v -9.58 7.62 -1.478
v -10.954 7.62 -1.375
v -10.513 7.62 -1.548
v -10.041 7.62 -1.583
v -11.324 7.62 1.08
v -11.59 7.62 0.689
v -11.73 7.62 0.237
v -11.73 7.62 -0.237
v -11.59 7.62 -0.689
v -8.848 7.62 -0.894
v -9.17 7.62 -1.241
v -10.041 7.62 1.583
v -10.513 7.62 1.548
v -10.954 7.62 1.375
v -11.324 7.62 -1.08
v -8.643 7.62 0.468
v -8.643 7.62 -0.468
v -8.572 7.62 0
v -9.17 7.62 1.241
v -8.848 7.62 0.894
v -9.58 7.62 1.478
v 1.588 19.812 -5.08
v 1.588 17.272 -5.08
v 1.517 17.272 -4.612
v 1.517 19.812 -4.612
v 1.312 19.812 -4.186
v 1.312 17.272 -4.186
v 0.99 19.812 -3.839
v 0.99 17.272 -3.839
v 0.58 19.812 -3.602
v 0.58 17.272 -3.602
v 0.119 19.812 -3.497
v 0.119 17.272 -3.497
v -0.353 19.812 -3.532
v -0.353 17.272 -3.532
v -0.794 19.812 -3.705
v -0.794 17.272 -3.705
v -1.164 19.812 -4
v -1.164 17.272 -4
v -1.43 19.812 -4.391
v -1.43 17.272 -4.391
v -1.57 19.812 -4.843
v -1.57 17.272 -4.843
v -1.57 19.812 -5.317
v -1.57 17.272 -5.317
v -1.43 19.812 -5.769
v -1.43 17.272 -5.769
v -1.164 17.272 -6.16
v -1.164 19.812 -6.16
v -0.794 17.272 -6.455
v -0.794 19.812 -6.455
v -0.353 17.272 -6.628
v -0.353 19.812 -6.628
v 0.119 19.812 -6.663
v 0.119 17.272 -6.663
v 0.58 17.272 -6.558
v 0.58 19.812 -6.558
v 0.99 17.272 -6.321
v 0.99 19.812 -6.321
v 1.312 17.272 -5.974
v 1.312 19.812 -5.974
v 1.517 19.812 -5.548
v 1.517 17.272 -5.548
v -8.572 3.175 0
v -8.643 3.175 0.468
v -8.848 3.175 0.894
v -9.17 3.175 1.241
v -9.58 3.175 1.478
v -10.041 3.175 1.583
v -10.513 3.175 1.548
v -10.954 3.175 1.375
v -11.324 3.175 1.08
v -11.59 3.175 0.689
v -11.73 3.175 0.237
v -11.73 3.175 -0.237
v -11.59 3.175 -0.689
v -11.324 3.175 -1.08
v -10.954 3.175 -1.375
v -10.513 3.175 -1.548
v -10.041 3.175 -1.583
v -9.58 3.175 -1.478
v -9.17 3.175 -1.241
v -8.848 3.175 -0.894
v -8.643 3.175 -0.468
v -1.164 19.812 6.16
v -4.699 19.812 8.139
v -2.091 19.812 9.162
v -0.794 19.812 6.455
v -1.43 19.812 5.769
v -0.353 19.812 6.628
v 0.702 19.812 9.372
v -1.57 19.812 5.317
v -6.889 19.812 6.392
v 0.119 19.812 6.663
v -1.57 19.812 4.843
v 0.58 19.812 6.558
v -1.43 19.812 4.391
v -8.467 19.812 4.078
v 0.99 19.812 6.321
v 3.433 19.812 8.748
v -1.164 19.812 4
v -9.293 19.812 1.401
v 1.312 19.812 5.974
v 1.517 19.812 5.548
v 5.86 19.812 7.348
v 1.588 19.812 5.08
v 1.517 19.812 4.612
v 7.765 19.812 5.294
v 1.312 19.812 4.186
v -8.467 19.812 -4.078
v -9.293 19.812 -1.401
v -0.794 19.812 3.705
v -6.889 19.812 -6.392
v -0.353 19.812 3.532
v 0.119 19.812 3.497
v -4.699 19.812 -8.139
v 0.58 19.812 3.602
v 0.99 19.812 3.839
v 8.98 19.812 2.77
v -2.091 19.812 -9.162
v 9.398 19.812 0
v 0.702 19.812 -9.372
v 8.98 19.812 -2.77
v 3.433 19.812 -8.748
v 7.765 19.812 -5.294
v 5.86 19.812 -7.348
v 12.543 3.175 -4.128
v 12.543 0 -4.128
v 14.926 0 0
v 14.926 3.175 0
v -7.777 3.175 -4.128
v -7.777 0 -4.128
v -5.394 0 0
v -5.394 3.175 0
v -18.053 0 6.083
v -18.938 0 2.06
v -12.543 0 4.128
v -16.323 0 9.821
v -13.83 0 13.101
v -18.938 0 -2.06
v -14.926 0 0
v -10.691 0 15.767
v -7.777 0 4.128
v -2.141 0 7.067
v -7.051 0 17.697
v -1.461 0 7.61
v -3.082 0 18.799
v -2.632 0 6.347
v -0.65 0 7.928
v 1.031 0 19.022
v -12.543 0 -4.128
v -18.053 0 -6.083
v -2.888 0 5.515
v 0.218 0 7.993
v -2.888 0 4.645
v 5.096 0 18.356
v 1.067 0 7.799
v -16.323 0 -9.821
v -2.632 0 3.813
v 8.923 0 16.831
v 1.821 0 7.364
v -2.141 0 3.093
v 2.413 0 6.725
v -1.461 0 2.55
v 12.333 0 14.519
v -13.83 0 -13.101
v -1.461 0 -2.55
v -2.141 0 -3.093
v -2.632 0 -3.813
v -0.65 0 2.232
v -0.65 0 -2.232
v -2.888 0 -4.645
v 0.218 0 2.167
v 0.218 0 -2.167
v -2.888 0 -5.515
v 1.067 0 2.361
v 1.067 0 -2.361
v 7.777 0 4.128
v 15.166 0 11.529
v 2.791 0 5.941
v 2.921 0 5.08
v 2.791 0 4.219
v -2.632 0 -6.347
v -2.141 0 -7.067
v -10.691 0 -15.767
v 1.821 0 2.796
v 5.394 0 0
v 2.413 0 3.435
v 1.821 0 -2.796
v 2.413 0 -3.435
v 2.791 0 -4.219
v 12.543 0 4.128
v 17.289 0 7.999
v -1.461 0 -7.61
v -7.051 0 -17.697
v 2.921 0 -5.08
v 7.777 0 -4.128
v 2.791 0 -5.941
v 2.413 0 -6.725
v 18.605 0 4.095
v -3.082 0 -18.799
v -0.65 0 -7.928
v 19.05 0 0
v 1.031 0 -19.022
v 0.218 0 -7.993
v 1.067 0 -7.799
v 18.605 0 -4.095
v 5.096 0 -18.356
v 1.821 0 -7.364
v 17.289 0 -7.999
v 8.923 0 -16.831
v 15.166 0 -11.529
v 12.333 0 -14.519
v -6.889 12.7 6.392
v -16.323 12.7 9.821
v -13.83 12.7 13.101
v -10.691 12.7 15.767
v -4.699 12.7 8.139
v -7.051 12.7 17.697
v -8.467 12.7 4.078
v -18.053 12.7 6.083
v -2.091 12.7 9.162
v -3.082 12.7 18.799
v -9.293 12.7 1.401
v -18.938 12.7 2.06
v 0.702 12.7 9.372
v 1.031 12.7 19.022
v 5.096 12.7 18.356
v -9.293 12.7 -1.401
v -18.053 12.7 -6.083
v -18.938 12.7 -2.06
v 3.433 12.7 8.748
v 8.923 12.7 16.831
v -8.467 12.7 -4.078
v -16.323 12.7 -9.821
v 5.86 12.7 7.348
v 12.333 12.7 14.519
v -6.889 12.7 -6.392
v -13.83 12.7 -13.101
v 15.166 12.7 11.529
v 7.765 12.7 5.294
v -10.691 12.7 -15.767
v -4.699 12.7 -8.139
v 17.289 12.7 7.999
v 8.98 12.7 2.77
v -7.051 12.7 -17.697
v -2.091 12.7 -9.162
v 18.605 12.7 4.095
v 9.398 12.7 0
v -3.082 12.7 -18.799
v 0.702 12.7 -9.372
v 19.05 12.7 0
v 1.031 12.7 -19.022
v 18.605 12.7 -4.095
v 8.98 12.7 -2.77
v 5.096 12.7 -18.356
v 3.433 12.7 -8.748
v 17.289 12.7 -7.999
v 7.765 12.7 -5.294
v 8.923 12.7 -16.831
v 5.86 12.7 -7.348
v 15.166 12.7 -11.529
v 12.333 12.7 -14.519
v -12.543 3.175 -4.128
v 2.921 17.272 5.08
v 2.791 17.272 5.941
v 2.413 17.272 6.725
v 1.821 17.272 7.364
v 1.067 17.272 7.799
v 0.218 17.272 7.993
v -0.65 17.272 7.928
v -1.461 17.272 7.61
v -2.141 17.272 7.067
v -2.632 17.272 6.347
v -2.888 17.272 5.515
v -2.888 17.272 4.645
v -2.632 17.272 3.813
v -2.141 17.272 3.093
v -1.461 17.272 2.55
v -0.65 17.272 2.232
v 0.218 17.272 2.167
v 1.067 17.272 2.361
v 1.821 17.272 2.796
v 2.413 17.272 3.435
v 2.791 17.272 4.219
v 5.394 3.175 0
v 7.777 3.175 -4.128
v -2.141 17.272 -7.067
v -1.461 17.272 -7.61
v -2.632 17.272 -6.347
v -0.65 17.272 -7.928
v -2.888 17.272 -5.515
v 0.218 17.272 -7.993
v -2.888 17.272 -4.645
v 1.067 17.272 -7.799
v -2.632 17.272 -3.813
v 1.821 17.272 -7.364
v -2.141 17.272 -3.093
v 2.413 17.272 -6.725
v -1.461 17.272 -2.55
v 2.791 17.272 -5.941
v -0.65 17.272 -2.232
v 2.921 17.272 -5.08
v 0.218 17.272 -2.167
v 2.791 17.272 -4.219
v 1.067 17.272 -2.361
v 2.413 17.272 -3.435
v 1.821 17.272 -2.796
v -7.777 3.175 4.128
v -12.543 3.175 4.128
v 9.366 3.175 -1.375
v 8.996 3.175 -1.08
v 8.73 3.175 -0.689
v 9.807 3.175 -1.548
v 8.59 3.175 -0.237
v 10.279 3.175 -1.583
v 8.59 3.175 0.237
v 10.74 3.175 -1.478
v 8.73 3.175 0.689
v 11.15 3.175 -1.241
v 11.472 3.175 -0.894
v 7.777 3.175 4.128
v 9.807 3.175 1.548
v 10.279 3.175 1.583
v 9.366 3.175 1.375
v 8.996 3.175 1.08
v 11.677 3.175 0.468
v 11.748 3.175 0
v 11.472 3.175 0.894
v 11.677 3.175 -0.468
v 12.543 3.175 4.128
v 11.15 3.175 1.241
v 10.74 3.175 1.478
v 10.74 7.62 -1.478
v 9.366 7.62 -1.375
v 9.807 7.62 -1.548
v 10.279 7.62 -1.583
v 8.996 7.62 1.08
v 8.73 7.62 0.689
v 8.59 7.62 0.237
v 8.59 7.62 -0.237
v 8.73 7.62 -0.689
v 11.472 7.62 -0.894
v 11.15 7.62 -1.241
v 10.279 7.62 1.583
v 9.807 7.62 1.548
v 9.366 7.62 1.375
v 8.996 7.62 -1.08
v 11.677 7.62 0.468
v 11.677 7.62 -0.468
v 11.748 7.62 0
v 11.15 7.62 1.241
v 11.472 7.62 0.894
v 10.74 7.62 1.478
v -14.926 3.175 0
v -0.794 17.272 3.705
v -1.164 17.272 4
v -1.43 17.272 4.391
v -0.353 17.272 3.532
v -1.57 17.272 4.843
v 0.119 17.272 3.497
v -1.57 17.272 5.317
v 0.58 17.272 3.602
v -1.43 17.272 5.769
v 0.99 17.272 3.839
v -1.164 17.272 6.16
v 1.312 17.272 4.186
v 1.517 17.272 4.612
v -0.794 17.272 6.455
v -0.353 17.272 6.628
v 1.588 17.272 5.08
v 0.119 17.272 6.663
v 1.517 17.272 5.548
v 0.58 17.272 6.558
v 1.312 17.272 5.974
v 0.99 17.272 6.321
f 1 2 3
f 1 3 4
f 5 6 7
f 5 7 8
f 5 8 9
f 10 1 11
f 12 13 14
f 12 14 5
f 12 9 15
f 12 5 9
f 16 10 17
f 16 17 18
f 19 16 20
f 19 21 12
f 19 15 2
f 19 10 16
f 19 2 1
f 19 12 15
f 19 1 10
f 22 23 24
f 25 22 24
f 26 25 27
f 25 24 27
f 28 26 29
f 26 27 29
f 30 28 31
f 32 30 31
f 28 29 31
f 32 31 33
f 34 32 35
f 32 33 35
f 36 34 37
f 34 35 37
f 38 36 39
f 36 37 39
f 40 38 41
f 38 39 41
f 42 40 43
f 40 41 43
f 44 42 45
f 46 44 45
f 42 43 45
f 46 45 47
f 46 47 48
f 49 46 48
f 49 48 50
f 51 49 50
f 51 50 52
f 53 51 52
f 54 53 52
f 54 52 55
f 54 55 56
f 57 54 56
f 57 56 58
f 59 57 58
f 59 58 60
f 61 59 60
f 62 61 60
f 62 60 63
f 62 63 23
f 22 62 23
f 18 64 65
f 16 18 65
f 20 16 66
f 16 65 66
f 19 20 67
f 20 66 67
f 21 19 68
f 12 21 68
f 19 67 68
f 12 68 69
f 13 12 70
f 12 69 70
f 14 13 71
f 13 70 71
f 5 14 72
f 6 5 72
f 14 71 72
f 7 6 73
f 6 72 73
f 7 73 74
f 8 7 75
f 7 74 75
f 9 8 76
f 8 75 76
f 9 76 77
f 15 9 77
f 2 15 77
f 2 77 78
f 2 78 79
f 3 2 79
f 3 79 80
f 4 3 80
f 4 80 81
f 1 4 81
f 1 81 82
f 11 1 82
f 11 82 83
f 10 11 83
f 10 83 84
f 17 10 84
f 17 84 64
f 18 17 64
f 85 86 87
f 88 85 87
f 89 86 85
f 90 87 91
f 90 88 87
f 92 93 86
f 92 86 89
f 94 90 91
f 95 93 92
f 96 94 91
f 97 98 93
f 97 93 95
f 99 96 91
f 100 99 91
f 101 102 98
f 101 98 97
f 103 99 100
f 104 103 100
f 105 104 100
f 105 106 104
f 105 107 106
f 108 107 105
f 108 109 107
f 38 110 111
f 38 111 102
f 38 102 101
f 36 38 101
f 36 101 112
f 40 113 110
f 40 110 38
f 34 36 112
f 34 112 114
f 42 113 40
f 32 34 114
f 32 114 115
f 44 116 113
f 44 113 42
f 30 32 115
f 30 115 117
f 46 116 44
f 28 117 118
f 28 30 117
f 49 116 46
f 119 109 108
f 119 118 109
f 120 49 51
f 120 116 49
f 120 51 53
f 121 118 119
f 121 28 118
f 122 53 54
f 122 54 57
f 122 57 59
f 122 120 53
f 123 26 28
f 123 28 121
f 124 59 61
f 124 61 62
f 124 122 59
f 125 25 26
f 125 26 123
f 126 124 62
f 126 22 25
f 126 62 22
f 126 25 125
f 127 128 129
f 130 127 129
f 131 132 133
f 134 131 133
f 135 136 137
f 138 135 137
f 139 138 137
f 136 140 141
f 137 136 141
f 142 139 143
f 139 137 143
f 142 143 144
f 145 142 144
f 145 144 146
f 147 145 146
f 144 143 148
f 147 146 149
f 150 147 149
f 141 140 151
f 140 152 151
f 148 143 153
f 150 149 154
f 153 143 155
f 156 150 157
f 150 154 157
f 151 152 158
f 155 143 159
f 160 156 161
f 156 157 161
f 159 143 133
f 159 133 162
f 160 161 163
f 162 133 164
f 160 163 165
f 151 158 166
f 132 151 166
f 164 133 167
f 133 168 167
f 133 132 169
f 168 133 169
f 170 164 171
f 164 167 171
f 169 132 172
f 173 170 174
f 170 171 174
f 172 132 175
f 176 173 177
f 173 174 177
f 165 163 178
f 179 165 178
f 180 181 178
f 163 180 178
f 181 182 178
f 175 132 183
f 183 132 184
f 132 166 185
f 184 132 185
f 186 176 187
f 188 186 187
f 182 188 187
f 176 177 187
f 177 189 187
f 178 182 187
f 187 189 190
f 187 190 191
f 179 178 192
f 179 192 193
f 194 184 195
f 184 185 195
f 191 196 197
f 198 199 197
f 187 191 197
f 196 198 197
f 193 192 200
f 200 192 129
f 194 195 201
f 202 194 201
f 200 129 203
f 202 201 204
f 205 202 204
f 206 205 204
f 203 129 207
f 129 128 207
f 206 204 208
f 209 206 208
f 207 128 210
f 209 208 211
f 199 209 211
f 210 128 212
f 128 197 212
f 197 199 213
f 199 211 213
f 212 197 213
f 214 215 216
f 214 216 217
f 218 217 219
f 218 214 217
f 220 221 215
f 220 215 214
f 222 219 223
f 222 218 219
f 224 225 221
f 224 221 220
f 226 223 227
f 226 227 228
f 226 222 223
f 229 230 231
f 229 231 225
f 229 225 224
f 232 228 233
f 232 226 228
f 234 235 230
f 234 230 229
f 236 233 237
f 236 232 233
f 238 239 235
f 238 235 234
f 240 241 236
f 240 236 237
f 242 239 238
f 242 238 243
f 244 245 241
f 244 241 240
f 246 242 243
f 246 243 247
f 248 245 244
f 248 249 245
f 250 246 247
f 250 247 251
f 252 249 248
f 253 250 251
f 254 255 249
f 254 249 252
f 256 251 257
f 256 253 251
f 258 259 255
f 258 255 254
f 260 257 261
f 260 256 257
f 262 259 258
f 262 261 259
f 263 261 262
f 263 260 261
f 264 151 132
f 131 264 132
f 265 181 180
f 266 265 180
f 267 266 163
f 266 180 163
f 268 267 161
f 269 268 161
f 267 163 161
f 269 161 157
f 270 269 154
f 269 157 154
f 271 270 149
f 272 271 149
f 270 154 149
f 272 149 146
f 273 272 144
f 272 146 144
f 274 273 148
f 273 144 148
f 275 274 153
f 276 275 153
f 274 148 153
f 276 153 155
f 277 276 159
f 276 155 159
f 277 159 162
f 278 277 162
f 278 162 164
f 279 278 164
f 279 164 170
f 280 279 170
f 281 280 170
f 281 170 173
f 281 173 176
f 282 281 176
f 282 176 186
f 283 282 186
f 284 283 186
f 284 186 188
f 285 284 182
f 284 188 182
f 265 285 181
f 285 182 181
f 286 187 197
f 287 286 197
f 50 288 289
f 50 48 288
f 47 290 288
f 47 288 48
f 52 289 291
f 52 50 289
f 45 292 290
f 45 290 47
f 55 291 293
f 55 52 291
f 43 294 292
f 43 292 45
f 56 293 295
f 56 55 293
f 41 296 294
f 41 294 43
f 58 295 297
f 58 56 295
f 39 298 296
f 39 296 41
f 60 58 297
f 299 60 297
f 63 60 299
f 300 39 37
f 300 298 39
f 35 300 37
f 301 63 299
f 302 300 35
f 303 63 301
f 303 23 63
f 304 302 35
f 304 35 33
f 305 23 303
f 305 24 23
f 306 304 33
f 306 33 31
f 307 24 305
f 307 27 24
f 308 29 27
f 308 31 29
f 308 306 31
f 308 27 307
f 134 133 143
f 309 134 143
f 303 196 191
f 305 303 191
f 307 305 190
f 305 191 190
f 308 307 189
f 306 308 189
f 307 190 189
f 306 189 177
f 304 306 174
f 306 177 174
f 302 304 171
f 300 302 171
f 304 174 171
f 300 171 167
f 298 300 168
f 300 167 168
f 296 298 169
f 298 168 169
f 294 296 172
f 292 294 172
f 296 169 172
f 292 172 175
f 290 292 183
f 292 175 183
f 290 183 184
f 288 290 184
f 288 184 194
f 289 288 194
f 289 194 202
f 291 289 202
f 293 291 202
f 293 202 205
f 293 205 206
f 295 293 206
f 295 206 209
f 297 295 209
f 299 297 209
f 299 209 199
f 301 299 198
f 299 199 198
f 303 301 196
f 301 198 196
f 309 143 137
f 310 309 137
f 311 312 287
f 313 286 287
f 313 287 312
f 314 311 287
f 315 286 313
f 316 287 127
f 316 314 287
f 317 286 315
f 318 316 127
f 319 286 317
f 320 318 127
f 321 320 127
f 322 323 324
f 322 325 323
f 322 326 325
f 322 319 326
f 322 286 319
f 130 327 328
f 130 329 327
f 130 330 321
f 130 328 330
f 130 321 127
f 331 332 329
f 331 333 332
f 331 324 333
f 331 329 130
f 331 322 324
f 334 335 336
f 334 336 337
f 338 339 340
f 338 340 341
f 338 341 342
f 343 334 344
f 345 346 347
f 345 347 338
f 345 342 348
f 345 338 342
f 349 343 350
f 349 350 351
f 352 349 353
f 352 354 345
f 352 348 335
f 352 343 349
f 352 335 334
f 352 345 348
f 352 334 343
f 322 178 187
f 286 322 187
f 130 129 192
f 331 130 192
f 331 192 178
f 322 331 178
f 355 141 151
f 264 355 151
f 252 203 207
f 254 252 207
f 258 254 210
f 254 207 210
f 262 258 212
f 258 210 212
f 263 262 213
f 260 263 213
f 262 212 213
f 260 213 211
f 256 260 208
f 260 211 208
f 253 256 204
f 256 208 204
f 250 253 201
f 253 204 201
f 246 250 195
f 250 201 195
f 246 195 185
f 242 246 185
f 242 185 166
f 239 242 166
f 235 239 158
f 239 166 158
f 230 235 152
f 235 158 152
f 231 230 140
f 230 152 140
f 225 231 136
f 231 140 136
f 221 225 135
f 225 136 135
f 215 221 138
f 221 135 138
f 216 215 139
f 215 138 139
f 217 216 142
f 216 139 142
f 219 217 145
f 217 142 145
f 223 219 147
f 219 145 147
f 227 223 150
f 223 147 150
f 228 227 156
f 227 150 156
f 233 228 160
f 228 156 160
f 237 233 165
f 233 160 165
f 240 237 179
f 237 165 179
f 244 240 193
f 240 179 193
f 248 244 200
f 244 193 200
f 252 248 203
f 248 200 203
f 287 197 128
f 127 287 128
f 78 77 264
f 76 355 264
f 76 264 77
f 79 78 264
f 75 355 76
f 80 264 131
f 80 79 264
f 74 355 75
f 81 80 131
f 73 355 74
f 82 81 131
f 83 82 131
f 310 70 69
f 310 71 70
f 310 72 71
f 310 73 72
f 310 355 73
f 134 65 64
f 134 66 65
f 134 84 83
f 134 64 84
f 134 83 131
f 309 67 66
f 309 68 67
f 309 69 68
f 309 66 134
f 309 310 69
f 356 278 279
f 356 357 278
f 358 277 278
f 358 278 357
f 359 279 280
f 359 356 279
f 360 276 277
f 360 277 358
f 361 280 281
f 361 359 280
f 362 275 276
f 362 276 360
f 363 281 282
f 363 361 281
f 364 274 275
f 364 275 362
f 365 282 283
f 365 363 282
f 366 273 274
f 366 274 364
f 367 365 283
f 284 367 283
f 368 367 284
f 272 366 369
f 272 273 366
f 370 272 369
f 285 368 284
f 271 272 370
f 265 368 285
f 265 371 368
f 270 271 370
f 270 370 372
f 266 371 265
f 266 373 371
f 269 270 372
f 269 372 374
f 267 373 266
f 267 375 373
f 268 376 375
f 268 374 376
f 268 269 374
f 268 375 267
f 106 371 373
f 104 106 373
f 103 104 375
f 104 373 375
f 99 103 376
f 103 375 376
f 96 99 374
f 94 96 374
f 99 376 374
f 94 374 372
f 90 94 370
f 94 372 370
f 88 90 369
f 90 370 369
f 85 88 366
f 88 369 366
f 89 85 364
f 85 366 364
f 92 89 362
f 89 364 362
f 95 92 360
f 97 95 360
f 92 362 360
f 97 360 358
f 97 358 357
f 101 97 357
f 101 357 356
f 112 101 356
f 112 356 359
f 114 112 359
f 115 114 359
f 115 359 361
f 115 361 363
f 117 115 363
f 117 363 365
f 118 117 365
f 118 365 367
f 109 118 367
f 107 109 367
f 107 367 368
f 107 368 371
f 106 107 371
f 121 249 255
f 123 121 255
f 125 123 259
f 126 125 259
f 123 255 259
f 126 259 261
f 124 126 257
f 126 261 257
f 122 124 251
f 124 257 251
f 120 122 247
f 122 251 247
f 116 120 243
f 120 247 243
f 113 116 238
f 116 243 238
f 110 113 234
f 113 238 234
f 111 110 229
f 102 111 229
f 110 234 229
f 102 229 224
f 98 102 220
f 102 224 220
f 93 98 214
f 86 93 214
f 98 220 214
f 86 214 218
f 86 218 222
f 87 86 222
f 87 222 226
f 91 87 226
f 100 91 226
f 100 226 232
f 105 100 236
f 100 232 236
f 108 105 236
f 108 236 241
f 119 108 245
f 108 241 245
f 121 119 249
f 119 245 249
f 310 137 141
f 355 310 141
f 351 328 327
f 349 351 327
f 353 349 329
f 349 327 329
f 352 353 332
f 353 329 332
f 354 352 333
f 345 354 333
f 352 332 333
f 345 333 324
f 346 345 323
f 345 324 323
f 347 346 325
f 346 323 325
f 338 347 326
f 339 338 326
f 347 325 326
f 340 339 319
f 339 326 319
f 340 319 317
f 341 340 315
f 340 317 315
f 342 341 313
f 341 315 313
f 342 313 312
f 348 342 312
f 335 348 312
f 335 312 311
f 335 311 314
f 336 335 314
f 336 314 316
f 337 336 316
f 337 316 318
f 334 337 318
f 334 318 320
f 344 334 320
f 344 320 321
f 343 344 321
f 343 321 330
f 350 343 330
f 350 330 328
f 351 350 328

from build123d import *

# Parameters (mm, degrees)
SKETCH1_R           = 19.05
BOSS_EXTRUDE1_DEPTH = 12.7
SKETCH2_R           = 9.398
BOSS_EXTRUDE2_DEPTH = 7.112
CUT_EXTRUDE3_DEPTH  = 3.175
SKETCH6_R           = 1.5875
CUT_EXTRUDE4_DEPTH  = 7.62
SKETCH7_R           = 2.921
CUT_EXTRUDE5_DEPTH  = 17.272
SKETCH8_R           = 1.5875
CUT_EXTRUDE6_DEPTH  = 3.54


with BuildPart() as part:
    # Sketch1 → Boss-Extrude1 (new body)
    with BuildSketch(Plane(origin=(0, 0, 0), x_dir=(1, 0, 0), z_dir=(0, 1, 0))):
        Circle(SKETCH1_R)
    extrude(amount=BOSS_EXTRUDE1_DEPTH)

    # Sketch2 → Boss-Extrude2 (add)
    with BuildSketch(Plane(origin=(0, 12.7, 0), x_dir=(1, 0, 0), z_dir=(0, 1, 0))):
        Circle(SKETCH2_R)
    extrude(amount=BOSS_EXTRUDE2_DEPTH)

    # Sketch5 → Cut-Extrude3 (cut)
    with BuildSketch(Plane.XZ):
        Polygon((-5.393973528, 0), (-7.776986764, 4.1275), (-12.543013236, 4.1275), (-14.926026472, 0), (-12.543013236, -4.1275), (-7.776986764, -4.1275), align=None)
        Polygon((14.926026472, 0), (12.543013236, 4.1275), (7.776986764, 4.1275), (5.393973528, 0), (7.776986764, -4.1275), (12.543013236, -4.1275), align=None)
    extrude(amount=-CUT_EXTRUDE3_DEPTH, mode=Mode.SUBTRACT)

    # Sketch6 → Cut-Extrude4 (cut)
    with BuildSketch(Plane.XZ):
        with Locations((-10.16, 0)):
            Circle(SKETCH6_R)
        with Locations((10.16, 0)):
            Circle(SKETCH6_R)
    extrude(amount=-CUT_EXTRUDE4_DEPTH, mode=Mode.SUBTRACT)

    # Sketch7 → Cut-Extrude5 (cut)
    with BuildSketch(Plane.XZ):
        with Locations((0, 5.08)):
            Circle(SKETCH7_R)
        with Locations((0, -5.08)):
            Circle(SKETCH7_R)
    extrude(amount=-CUT_EXTRUDE5_DEPTH, mode=Mode.SUBTRACT)

    # Sketch8 → Cut-Extrude6 (cut, through all)
    with BuildSketch(Plane.XZ.offset(-17.272)):
        with Locations((0, 5.08)):
            Circle(SKETCH8_R)
        with Locations((0, -5.08)):
            Circle(SKETCH8_R)
    extrude(amount=-CUT_EXTRUDE6_DEPTH, mode=Mode.SUBTRACT)


solid = part.part
